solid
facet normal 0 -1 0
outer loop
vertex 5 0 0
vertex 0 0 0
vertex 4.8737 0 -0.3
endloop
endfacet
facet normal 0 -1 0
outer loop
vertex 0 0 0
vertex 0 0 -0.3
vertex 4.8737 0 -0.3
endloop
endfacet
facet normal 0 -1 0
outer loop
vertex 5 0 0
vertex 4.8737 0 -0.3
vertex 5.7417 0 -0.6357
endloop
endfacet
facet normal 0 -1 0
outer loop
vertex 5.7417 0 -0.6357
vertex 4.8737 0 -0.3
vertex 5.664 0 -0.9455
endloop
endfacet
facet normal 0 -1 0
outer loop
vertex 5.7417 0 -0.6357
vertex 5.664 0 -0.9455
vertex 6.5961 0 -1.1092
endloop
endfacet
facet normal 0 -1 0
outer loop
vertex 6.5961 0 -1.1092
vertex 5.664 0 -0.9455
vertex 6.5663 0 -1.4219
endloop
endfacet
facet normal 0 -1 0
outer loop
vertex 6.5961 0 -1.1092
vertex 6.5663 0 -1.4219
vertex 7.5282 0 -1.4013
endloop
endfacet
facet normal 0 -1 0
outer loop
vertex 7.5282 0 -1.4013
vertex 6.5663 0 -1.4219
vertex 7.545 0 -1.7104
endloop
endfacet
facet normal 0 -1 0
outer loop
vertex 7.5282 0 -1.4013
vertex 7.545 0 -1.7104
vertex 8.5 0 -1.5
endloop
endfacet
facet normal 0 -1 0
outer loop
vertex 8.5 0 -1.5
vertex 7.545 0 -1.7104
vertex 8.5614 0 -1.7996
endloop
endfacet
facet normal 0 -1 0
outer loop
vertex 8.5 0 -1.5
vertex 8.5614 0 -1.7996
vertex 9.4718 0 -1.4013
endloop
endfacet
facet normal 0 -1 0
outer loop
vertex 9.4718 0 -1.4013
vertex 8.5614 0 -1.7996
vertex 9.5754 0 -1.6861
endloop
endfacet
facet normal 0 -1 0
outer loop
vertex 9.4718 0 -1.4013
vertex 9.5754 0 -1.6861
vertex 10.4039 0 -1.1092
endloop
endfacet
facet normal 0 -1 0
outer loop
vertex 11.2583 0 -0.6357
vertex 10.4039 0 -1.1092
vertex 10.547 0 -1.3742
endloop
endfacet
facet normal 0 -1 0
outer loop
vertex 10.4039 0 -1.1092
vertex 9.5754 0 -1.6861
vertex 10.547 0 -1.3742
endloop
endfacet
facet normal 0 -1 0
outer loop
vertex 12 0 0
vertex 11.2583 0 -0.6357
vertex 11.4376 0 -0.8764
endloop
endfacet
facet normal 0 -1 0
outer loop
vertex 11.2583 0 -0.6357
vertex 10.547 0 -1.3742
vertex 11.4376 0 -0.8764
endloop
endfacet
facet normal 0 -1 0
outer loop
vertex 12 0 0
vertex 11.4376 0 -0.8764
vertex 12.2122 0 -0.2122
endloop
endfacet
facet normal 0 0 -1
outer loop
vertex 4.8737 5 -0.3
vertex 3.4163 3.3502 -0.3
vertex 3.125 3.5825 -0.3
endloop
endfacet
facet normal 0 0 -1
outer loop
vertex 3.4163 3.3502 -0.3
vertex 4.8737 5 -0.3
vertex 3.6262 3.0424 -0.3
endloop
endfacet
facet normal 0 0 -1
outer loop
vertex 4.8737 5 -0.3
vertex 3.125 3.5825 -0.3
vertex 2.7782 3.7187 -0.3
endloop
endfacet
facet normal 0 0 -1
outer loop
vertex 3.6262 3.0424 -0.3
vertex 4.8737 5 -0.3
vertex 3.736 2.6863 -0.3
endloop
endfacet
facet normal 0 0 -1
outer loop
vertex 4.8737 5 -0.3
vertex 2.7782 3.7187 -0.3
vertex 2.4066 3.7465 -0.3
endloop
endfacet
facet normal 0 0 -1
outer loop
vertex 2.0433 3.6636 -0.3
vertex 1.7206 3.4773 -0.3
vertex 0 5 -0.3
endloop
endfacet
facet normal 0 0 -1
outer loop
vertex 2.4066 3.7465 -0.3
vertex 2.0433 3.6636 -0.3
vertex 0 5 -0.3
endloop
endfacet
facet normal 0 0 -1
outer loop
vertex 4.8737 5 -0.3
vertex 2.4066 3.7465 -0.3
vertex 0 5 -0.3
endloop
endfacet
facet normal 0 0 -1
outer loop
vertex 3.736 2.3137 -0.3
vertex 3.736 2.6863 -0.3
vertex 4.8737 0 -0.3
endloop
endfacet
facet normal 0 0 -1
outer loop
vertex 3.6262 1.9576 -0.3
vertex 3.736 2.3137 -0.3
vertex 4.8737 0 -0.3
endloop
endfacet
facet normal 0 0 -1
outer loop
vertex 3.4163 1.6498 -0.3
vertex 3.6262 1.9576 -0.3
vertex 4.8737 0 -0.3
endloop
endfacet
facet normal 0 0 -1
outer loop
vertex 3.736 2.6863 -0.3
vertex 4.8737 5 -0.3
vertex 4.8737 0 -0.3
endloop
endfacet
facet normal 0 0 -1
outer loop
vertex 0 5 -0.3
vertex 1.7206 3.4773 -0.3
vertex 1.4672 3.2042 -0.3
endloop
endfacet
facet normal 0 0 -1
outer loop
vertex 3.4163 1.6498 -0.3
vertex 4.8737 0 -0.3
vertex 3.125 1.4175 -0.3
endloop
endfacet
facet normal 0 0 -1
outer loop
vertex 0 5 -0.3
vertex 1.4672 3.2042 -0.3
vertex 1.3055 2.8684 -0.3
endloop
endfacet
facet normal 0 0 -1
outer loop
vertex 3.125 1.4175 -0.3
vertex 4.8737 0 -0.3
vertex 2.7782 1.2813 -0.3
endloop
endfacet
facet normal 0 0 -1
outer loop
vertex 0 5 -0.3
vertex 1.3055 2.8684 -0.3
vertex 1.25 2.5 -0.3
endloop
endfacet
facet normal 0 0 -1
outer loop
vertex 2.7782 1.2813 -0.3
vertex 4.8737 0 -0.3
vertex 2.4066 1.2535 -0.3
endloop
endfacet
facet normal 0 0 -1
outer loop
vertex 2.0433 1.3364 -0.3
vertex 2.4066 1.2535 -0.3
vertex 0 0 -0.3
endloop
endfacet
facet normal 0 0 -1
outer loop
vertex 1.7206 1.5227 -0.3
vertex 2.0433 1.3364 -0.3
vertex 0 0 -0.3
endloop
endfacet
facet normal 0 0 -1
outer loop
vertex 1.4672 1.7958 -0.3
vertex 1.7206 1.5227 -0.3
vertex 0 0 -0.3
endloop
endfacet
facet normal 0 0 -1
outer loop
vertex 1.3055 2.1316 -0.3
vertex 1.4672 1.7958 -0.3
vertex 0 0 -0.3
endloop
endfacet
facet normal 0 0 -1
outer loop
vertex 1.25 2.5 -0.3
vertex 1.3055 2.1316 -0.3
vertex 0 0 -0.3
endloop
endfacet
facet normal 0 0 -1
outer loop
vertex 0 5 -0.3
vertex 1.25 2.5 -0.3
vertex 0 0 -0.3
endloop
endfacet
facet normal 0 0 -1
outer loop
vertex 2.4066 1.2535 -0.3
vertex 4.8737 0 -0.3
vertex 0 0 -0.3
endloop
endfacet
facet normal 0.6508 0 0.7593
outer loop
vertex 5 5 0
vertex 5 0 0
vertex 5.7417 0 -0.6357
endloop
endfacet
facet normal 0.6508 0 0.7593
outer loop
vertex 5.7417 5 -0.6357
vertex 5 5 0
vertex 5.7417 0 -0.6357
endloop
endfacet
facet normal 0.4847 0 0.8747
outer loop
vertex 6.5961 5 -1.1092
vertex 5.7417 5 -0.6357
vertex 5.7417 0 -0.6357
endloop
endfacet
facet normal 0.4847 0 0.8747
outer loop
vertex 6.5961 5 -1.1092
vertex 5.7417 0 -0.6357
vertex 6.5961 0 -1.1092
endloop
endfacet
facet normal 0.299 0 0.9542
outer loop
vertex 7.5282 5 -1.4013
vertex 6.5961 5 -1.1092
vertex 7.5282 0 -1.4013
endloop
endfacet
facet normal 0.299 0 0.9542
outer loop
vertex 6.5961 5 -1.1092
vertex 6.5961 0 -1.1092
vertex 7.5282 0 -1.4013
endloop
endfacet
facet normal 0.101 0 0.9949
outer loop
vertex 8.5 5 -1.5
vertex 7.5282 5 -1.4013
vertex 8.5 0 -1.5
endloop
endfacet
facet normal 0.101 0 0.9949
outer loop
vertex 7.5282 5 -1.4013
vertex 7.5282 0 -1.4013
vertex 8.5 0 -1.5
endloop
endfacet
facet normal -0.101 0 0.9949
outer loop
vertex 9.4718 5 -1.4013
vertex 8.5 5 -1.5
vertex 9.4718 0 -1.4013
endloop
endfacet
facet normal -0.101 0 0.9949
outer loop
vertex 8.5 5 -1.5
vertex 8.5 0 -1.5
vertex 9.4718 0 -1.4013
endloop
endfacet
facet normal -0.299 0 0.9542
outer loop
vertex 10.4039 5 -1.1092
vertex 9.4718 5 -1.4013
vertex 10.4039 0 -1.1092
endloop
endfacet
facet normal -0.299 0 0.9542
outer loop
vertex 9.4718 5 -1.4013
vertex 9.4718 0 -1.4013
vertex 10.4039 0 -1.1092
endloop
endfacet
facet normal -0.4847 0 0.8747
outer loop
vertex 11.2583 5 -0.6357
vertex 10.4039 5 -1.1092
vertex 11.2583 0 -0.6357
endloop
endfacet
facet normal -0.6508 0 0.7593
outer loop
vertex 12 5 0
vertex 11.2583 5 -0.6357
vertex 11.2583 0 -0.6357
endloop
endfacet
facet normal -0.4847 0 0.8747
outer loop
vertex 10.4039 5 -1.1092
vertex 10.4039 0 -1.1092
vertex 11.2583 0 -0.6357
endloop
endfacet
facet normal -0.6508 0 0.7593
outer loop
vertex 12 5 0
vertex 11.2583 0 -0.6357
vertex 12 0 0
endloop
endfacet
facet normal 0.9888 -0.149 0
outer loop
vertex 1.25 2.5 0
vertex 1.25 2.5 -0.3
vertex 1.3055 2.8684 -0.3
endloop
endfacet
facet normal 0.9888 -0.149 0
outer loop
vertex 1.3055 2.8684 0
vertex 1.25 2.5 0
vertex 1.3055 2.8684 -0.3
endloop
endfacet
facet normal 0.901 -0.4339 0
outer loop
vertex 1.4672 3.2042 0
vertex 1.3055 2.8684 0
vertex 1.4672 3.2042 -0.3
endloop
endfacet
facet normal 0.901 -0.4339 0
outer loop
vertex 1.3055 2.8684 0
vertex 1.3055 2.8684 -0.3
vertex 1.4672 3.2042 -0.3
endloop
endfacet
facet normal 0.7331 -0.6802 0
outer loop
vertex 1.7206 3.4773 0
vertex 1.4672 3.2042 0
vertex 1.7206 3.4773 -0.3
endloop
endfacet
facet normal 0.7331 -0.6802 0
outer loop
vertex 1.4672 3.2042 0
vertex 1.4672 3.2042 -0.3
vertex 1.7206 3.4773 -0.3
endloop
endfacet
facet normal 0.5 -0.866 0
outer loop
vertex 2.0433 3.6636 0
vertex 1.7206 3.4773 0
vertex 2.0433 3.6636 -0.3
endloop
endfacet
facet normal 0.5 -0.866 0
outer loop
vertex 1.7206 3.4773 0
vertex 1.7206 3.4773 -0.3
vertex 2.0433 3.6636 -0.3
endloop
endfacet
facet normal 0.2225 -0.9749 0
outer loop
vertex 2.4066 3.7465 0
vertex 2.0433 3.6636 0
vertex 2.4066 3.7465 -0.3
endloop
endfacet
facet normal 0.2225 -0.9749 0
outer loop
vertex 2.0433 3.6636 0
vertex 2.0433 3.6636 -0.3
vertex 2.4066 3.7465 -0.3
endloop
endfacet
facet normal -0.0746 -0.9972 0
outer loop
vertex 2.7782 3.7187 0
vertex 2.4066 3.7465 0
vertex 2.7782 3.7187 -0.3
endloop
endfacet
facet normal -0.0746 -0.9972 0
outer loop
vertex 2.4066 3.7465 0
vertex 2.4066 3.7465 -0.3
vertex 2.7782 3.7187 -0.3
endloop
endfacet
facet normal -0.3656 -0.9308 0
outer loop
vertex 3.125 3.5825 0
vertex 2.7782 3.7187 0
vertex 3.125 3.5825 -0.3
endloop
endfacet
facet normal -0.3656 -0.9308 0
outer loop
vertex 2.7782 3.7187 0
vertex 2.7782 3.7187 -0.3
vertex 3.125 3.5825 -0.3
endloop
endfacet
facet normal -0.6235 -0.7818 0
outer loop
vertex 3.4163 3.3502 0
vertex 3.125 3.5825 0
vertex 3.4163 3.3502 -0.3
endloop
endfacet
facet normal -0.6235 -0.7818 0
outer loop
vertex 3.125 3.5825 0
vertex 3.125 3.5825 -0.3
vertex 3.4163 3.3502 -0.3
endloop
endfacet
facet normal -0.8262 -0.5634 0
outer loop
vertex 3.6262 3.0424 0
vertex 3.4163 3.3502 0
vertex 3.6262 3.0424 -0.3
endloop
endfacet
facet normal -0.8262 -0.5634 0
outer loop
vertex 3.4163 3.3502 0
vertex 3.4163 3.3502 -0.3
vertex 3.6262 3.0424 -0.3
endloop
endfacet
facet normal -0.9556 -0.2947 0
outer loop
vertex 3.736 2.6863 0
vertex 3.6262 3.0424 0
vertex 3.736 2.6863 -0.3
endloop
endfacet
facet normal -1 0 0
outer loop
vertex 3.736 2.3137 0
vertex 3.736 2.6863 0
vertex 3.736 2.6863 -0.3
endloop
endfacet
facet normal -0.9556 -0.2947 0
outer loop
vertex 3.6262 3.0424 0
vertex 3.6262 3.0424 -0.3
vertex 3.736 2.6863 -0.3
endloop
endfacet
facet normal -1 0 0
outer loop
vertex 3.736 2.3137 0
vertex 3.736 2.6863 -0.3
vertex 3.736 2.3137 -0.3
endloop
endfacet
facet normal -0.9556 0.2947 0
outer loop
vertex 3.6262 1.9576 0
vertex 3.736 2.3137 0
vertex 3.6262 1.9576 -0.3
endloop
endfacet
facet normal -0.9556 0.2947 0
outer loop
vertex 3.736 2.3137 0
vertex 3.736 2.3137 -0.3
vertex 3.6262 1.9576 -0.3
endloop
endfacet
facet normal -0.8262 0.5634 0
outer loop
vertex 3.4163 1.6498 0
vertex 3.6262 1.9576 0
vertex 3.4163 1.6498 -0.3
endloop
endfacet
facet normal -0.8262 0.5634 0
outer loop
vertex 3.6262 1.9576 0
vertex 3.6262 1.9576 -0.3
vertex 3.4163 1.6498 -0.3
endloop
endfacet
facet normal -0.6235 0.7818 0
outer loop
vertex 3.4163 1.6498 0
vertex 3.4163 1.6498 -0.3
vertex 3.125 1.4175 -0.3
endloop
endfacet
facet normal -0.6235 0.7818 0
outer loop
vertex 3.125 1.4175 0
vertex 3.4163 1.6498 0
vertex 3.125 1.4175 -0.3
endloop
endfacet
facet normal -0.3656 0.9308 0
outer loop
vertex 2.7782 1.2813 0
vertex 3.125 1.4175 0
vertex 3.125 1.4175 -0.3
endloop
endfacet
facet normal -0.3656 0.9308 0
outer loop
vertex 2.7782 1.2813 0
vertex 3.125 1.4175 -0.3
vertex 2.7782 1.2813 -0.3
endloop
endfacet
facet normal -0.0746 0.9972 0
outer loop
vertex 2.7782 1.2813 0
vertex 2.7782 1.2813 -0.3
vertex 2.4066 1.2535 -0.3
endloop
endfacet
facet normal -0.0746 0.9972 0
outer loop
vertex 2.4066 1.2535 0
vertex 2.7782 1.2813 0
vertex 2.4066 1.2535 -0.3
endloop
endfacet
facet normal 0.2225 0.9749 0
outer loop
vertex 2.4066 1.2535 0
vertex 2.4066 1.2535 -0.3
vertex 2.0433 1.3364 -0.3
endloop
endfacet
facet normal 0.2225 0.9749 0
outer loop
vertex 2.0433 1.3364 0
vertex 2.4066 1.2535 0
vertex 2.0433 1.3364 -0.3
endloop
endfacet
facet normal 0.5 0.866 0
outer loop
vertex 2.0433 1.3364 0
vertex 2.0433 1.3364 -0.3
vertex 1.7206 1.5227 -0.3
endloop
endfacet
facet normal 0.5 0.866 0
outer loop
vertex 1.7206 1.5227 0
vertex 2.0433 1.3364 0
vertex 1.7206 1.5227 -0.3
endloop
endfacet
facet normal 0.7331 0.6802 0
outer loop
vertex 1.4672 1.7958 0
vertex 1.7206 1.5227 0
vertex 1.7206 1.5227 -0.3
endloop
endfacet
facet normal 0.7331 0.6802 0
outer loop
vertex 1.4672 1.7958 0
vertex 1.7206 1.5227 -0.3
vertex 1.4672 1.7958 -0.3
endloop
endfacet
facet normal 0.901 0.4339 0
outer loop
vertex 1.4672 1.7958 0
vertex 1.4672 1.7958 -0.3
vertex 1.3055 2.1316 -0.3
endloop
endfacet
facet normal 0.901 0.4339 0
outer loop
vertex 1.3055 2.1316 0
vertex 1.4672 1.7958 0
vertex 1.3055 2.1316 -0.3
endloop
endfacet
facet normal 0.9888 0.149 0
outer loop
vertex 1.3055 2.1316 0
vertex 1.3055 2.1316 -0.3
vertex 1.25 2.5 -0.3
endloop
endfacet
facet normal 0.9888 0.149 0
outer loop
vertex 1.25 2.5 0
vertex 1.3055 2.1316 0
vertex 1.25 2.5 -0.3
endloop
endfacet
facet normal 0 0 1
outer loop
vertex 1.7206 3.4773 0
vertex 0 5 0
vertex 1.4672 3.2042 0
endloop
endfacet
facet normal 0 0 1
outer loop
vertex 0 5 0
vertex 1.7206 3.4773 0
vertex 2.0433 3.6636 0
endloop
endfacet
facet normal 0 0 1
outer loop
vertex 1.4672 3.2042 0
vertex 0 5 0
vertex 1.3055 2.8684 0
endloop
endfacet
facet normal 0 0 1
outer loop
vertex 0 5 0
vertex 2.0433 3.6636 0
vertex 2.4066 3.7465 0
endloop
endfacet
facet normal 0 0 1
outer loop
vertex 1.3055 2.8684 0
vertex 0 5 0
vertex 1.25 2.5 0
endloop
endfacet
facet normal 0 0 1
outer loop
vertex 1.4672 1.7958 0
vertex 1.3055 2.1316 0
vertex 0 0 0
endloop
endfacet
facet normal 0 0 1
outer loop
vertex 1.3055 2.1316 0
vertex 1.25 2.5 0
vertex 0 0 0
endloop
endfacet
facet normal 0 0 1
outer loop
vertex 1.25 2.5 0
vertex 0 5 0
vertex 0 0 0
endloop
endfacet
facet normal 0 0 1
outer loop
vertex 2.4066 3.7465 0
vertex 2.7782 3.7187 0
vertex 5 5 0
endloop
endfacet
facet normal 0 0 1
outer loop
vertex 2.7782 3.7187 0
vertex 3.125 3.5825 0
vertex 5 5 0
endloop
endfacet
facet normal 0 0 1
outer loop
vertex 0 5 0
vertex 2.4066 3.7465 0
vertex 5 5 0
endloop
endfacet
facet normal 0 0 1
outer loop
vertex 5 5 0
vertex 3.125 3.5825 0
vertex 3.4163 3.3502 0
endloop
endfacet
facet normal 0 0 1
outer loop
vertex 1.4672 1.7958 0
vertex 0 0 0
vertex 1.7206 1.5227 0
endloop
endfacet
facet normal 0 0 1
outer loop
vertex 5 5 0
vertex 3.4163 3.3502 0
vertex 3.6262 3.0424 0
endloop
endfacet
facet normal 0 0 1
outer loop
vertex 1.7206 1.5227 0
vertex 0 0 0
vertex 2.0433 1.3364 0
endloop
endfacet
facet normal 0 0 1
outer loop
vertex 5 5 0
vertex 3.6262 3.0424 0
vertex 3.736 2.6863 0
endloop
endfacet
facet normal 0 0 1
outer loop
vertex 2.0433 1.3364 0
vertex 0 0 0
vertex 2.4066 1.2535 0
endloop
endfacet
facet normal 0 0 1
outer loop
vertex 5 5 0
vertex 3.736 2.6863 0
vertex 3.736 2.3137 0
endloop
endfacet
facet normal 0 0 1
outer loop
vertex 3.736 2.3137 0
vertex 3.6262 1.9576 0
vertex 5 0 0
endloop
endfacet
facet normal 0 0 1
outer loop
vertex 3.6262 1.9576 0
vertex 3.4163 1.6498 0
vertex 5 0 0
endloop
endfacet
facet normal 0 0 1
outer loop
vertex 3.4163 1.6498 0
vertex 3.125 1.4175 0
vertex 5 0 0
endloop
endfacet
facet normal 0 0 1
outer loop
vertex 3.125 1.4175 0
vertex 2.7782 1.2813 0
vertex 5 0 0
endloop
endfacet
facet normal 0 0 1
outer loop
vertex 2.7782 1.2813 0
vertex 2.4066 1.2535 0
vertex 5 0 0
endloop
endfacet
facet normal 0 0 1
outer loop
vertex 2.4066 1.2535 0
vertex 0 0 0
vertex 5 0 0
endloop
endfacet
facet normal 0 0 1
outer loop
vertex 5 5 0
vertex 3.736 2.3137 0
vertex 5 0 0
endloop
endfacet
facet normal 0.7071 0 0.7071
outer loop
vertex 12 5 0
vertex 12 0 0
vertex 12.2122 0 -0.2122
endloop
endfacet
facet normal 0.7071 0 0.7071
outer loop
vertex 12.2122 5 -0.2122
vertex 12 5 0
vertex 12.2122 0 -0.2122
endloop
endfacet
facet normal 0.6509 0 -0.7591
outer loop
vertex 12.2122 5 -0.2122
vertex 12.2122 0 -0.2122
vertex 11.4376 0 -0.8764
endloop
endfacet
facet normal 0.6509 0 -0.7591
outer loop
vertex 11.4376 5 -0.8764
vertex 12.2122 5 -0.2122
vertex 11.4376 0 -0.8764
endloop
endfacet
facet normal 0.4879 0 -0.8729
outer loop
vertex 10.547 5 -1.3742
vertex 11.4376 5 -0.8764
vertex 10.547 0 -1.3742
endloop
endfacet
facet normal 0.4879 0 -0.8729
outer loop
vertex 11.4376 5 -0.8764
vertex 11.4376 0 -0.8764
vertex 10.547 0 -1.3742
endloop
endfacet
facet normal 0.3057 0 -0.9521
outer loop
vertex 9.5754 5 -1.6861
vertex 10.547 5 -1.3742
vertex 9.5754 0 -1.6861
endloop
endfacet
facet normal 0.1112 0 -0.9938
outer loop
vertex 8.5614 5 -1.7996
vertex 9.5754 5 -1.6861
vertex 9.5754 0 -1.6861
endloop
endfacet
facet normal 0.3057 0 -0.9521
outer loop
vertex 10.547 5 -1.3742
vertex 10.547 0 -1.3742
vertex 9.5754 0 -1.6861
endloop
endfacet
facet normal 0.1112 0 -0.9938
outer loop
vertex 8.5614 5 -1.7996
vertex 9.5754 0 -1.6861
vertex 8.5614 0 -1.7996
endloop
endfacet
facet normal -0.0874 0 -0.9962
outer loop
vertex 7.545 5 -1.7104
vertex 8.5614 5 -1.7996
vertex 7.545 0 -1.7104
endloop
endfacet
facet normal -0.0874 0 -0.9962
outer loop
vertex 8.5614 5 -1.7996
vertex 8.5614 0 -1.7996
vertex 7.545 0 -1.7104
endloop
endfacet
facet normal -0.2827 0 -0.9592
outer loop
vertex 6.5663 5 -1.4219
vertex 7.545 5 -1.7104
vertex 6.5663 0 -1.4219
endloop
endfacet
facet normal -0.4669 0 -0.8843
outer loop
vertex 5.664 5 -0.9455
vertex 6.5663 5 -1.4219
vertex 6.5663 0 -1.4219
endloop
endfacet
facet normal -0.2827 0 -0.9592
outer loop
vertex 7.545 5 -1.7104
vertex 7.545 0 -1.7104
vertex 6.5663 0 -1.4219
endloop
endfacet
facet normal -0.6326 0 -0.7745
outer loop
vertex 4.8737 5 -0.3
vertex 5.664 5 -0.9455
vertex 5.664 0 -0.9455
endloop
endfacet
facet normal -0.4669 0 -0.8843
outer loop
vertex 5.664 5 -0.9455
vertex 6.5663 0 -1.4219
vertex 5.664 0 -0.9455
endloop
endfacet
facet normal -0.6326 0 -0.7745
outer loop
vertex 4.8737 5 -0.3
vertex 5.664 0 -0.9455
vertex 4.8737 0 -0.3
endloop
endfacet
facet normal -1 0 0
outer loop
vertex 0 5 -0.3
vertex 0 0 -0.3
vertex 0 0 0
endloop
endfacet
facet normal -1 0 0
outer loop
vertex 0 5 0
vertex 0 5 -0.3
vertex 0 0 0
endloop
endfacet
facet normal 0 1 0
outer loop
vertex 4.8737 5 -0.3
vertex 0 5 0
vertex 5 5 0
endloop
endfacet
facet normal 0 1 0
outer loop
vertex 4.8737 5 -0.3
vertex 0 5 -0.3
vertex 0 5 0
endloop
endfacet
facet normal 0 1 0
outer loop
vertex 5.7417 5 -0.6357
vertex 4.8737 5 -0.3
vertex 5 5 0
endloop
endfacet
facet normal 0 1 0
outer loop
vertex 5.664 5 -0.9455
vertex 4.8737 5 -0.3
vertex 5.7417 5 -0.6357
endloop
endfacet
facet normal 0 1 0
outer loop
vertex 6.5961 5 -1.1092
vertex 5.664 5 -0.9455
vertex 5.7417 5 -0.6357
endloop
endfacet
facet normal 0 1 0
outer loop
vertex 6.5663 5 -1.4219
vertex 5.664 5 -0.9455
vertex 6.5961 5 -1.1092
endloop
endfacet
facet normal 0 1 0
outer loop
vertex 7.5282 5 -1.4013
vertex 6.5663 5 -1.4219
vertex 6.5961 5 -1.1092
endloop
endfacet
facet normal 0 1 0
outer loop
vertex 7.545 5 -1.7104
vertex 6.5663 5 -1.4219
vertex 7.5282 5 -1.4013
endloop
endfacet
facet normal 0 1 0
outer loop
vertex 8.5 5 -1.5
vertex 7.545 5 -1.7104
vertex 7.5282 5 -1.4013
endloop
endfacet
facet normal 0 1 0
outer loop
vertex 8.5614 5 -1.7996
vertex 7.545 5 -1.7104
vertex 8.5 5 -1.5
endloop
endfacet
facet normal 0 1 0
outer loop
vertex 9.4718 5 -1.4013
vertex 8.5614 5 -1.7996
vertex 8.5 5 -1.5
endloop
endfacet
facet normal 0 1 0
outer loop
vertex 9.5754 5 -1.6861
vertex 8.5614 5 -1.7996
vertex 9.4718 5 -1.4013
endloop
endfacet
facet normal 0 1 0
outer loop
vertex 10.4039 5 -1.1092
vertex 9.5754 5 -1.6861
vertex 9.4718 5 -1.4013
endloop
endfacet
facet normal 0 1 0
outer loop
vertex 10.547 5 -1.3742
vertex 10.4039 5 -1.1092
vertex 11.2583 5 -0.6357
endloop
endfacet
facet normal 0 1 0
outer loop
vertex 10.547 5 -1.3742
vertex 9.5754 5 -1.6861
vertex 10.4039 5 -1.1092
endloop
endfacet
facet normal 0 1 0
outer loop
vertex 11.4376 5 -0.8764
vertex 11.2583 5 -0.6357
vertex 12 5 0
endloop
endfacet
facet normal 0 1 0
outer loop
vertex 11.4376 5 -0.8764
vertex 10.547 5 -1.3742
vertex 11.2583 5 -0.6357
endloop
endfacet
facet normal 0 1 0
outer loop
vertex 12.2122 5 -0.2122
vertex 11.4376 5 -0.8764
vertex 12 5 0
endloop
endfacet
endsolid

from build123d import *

# Parameters (mm, degrees)
EXTRUDE_1_DEPTH     = 5
SKETCH_2_R          = 1.25
CUT_EXTRUDE_1_DEPTH = 5


with BuildPart() as part:
    # 草图1 → 凸台-拉伸1 (new body)
    with BuildSketch(Plane(origin=(0, 0, 0), x_dir=(1, 0, 0), z_dir=(0, 1, 0))):
        with BuildLine():
            Line((0, 0), (5, 0))
            ThreePointArc((5, 0), (8.5, 1.5), (12, 0))
            Line((12, 0), (12.212191433, 0.212191433))
            ThreePointArc((12.212191433, 0.212191433), (8.561418456, 1.799632562), (4.873707127, 0.3))
            Line((4.873707127, 0.3), (0, 0.3))
            Line((0, 0.3), (0, 0))
        make_face()
    extrude(amount=EXTRUDE_1_DEPTH)

    # 草图2 → 切除-拉伸1 (cut)
    with BuildSketch(Plane(origin=(0, 0, -0.3), x_dir=(-1, 0, 0), z_dir=(0, 0, -1))):
        with Locations((-2.5, 2.5)):
            Circle(SKETCH_2_R)
    extrude(amount=-CUT_EXTRUDE_1_DEPTH, mode=Mode.SUBTRACT)


solid = part.part
